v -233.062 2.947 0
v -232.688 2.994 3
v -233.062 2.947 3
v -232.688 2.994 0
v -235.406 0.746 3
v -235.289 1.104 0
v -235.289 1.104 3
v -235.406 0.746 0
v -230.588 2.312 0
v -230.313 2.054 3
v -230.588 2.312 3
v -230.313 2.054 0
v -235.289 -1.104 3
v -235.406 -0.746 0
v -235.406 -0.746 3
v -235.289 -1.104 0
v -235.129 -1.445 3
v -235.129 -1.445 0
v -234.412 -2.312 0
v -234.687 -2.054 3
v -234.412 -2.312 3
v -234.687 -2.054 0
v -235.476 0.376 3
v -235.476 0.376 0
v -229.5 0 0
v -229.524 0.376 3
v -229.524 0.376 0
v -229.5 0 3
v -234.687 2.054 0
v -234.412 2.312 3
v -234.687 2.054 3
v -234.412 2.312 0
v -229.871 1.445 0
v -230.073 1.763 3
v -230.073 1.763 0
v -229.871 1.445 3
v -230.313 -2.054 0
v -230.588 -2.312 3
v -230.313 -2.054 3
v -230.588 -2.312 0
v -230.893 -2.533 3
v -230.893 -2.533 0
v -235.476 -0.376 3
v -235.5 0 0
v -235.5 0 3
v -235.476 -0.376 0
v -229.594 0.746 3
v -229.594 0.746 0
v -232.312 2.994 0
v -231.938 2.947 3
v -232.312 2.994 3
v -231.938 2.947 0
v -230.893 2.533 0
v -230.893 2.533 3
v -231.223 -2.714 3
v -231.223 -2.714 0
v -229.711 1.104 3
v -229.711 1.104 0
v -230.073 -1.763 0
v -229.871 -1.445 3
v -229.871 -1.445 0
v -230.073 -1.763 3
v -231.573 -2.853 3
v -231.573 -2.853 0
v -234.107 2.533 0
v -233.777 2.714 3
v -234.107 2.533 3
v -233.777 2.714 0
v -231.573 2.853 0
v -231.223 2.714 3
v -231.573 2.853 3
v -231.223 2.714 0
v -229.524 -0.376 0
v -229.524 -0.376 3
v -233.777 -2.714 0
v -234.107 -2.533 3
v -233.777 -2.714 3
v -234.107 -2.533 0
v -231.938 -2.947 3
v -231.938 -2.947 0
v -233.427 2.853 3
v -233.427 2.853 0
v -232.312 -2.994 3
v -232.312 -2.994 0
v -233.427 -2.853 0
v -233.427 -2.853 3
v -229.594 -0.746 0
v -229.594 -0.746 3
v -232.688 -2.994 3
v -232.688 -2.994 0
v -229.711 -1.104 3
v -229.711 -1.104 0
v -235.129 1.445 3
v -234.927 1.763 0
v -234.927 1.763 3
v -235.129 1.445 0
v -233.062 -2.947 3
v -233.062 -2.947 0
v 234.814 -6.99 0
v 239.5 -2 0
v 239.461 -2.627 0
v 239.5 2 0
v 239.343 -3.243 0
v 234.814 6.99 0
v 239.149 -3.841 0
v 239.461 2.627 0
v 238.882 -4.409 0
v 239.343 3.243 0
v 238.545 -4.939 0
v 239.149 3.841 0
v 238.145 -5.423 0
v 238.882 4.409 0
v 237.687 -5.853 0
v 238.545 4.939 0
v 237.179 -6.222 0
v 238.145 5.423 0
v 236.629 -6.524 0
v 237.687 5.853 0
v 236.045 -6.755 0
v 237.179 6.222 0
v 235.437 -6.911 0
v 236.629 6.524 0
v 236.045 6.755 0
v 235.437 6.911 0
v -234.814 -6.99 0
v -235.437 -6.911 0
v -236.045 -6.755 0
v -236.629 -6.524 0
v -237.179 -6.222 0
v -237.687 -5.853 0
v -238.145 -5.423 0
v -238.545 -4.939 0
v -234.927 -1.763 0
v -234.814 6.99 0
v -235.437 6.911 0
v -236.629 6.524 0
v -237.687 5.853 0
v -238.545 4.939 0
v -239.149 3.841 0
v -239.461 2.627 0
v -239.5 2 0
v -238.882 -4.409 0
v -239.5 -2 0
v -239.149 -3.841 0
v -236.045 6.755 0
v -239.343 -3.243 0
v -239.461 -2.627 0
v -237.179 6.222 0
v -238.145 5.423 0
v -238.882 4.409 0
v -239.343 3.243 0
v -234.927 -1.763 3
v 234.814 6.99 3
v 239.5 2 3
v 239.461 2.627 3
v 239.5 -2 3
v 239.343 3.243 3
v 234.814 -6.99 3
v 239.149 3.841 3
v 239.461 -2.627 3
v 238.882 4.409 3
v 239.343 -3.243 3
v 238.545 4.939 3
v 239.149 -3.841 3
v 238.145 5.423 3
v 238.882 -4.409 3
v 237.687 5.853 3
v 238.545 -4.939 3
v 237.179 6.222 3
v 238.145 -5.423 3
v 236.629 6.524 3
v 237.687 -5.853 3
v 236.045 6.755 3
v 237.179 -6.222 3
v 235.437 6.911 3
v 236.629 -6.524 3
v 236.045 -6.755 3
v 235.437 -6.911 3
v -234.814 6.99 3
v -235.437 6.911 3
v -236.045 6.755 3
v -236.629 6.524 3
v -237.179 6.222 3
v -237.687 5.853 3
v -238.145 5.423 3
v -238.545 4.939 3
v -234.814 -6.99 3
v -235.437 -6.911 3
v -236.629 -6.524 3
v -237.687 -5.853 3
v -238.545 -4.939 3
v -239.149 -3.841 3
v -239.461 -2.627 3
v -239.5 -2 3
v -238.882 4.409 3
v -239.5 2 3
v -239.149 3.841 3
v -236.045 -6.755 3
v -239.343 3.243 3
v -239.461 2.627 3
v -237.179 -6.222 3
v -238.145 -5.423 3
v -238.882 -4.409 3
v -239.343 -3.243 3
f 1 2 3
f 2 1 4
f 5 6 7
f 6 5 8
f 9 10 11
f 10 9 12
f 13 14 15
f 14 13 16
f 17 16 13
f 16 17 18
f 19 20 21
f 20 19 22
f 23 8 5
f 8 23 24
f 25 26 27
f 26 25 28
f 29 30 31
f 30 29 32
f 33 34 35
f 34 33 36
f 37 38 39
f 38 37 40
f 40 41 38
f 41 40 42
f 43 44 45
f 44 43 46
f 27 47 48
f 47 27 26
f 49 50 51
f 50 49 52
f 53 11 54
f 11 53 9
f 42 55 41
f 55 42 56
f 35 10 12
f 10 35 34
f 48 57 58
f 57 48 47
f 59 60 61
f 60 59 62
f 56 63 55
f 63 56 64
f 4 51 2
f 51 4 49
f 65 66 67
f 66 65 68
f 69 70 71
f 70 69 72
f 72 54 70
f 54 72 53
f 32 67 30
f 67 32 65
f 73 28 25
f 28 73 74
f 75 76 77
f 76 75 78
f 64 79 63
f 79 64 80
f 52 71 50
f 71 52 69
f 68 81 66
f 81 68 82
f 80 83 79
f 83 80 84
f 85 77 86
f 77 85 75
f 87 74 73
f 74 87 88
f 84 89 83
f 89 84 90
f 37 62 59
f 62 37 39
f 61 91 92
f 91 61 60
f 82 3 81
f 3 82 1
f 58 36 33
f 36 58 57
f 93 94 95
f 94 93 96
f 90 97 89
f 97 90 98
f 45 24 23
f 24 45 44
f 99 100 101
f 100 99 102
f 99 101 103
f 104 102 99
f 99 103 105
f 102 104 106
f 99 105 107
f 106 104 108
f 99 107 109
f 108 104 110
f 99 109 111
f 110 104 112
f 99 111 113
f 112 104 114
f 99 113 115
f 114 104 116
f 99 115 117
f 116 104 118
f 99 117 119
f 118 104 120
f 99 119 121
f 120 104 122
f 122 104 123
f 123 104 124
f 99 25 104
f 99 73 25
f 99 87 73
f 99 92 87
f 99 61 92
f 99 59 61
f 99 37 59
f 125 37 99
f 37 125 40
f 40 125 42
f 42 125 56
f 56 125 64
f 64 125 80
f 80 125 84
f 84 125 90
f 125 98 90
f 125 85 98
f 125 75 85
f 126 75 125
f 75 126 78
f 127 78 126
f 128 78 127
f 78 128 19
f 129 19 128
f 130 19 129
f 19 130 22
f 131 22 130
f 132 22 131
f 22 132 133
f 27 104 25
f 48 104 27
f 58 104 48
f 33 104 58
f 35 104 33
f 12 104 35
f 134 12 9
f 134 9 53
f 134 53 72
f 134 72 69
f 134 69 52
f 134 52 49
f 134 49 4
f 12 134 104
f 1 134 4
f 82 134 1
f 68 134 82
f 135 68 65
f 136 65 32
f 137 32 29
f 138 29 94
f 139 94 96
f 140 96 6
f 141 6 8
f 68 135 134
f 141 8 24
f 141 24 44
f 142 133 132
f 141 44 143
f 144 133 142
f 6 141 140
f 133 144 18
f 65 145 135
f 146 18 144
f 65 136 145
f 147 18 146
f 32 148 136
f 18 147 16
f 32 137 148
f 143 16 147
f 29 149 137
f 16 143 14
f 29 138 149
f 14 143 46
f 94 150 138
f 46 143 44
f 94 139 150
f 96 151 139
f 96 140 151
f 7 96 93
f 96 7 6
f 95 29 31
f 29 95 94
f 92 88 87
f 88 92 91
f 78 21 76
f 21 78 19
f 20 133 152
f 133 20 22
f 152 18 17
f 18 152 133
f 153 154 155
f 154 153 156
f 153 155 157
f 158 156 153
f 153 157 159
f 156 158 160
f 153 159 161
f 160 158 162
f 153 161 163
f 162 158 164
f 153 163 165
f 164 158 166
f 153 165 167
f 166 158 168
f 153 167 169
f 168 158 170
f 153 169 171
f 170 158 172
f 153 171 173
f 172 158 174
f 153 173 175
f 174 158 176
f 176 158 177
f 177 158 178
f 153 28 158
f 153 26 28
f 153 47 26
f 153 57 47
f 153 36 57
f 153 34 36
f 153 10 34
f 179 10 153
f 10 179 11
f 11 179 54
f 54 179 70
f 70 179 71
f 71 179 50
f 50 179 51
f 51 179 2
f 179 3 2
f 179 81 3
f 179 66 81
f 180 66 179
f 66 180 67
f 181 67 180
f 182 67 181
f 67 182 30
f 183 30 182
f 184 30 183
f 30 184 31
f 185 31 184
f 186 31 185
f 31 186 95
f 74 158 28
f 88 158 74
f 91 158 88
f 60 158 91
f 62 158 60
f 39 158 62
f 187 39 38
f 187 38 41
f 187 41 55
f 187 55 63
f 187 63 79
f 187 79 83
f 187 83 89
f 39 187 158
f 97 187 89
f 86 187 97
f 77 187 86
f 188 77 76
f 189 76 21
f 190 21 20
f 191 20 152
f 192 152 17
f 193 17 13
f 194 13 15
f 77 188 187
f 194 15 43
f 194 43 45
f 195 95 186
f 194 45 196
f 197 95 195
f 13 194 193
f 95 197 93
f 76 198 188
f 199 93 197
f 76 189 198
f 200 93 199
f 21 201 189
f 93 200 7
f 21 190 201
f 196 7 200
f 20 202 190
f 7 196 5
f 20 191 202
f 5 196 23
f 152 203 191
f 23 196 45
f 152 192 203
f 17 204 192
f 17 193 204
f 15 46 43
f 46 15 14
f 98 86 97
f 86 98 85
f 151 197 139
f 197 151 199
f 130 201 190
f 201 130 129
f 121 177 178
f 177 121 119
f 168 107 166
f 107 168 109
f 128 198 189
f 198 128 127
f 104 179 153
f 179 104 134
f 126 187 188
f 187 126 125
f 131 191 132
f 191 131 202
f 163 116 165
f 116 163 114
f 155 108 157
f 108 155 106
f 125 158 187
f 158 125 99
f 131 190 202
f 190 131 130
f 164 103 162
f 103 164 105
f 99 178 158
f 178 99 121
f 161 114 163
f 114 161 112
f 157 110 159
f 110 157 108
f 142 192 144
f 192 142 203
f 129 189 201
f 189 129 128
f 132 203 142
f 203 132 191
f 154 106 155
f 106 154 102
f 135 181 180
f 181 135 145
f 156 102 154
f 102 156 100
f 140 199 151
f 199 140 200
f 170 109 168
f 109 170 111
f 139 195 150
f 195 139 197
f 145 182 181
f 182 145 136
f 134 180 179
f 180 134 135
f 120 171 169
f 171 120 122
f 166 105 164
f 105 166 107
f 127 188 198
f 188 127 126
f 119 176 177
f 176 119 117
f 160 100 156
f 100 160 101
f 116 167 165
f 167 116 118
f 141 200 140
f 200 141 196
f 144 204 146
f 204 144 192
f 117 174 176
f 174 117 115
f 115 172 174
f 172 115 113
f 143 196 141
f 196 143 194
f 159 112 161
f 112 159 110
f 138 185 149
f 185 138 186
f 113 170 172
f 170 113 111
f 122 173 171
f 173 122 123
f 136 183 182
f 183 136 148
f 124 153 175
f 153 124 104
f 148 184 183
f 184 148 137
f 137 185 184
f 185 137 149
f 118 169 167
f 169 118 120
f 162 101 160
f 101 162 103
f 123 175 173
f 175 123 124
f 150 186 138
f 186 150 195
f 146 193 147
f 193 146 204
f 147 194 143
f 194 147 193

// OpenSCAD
$fn = 50;


difference() {
	union() {
		hull() {
			translate(v = [-234.5000000000, 2.0000000000, 0]) {
				cylinder(h = 3, r = 5);
			}
			translate(v = [234.5000000000, 2.0000000000, 0]) {
				cylinder(h = 3, r = 5);
			}
			translate(v = [-234.5000000000, -2.0000000000, 0]) {
				cylinder(h = 3, r = 5);
			}
			translate(v = [234.5000000000, -2.0000000000, 0]) {
				cylinder(h = 3, r = 5);
			}
		}
	}
	union() {
		translate(v = [-232.5000000000, 0.0000000000, 0]) {
			cylinder(h = 3, r = 3.0000000000);
		}
		translate(v = [-232.5000000000, 0.0000000000, 0]) {
			cylinder(h = 3, r = 1.5000000000);
		}
		translate(v = [-232.5000000000, 0.0000000000, 0]) {
			cylinder(h = 3, r = 1.5000000000);
		}
		translate(v = [-232.5000000000, 0.0000000000, 0]) {
			cylinder(h = 3, r = 1.5000000000);
		}
	}
}
